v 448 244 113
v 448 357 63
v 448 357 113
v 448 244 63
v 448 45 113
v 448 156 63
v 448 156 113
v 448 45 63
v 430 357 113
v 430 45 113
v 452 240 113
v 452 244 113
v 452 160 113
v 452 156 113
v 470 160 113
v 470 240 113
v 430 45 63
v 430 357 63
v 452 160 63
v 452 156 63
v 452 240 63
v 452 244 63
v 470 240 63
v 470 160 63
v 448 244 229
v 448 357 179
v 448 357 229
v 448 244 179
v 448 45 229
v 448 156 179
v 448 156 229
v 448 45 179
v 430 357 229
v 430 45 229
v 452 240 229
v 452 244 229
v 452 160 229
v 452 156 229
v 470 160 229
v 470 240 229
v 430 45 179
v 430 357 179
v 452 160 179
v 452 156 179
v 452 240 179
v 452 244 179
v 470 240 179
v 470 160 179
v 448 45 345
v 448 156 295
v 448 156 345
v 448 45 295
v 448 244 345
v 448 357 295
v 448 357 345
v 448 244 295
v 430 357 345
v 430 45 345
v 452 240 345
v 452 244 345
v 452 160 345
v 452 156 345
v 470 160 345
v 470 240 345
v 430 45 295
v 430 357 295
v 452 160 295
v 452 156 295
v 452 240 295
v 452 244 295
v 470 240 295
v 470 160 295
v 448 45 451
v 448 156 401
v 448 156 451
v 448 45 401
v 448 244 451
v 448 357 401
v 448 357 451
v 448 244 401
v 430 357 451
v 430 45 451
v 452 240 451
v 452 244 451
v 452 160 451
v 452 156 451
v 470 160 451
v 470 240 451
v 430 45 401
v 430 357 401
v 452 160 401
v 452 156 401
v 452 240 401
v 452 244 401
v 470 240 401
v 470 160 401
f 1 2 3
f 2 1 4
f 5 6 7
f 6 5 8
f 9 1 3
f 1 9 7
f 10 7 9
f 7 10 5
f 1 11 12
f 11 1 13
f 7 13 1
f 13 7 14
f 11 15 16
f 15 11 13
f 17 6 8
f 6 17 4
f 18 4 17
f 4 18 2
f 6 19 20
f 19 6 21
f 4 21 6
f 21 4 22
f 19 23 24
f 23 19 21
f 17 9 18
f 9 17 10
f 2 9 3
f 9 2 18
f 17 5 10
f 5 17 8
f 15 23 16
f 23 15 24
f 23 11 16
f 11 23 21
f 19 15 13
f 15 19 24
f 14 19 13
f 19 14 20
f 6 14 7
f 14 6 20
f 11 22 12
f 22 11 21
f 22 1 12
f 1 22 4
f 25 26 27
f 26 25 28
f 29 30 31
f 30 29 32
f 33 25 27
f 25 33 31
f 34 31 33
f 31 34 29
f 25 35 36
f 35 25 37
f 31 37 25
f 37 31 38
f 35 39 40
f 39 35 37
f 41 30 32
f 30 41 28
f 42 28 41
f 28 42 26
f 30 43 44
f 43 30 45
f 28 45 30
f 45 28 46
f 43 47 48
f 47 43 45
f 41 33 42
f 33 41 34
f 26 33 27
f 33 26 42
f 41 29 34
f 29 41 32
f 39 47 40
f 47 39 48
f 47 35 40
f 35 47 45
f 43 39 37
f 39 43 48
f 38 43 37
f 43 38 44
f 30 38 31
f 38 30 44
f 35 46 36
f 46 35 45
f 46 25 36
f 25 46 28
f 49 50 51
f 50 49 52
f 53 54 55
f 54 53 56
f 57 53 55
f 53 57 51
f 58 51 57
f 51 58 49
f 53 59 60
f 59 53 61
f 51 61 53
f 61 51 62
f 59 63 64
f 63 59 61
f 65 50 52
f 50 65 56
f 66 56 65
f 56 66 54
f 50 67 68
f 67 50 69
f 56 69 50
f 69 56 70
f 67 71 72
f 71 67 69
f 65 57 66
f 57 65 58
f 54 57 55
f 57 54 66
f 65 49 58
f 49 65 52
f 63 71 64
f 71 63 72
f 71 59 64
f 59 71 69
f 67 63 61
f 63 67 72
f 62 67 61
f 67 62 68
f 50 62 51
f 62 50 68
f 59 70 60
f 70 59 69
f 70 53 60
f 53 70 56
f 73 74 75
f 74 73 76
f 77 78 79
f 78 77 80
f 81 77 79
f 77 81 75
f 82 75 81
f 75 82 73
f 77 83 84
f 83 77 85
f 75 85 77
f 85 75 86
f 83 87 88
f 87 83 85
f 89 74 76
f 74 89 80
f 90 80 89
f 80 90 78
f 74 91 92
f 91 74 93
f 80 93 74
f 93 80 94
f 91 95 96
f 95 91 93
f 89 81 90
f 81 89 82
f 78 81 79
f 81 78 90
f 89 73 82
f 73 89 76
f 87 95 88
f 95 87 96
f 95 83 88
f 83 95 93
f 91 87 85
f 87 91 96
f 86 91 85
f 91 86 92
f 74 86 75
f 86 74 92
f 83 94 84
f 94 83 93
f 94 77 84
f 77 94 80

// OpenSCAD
// K33 SERVICE ENVELOPES ONLY, CNC HOLD. ext=true selects long row1.
ext=false;
if(true) translate([430, 45, 63]) cube([18, 312, 50]); // bar
if(true) translate([448, 160, 63]) cube([22, 80, 50]); // integral_nose
if(true) translate([448, 156, 63]) cube([4, 4, 50]); // root_F_envelope
if(true) translate([448, 240, 63]) cube([4, 4, 50]); // root_R_envelope
if(!ext) translate([430, 45, 179]) cube([18, 312, 50]); // bar
if(!ext) translate([448, 160, 179]) cube([22, 80, 50]); // integral_nose
if(!ext) translate([448, 156, 179]) cube([4, 4, 50]); // root_F_envelope
if(!ext) translate([448, 240, 179]) cube([4, 4, 50]); // root_R_envelope
if(ext) translate([430, 45, 179]) cube([18, 312, 50]); // bar
if(ext) translate([448, 160, 179]) cube([4, 80, 50]); // flange
if(ext) translate([452, 190, 194]) cube([295.1, 20, 20]); // tube_envelope
if(ext) translate([452, 188, 192]) cube([2, 24, 24]); // weld_envelope
if(ext) translate([452, 176, 185]) cube([4, 8, 8]); // M4_head
if(ext) translate([452, 176, 215]) cube([4, 8, 8]); // M4_head
if(ext) translate([452, 216, 185]) cube([4, 8, 8]); // M4_head
if(ext) translate([452, 216, 215]) cube([4, 8, 8]); // M4_head
if(true) translate([430, 45, 295]) cube([18, 312, 50]); // bar
if(true) translate([448, 160, 295]) cube([22, 80, 50]); // integral_nose
if(true) translate([448, 156, 295]) cube([4, 4, 50]); // root_F_envelope
if(true) translate([448, 240, 295]) cube([4, 4, 50]); // root_R_envelope
if(true) translate([430, 45, 401]) cube([18, 312, 50]); // bar
if(true) translate([448, 160, 401]) cube([22, 80, 50]); // integral_nose
if(true) translate([448, 156, 401]) cube([4, 4, 50]); // root_F_envelope
if(true) translate([448, 240, 401]) cube([4, 4, 50]); // root_R_envelope
